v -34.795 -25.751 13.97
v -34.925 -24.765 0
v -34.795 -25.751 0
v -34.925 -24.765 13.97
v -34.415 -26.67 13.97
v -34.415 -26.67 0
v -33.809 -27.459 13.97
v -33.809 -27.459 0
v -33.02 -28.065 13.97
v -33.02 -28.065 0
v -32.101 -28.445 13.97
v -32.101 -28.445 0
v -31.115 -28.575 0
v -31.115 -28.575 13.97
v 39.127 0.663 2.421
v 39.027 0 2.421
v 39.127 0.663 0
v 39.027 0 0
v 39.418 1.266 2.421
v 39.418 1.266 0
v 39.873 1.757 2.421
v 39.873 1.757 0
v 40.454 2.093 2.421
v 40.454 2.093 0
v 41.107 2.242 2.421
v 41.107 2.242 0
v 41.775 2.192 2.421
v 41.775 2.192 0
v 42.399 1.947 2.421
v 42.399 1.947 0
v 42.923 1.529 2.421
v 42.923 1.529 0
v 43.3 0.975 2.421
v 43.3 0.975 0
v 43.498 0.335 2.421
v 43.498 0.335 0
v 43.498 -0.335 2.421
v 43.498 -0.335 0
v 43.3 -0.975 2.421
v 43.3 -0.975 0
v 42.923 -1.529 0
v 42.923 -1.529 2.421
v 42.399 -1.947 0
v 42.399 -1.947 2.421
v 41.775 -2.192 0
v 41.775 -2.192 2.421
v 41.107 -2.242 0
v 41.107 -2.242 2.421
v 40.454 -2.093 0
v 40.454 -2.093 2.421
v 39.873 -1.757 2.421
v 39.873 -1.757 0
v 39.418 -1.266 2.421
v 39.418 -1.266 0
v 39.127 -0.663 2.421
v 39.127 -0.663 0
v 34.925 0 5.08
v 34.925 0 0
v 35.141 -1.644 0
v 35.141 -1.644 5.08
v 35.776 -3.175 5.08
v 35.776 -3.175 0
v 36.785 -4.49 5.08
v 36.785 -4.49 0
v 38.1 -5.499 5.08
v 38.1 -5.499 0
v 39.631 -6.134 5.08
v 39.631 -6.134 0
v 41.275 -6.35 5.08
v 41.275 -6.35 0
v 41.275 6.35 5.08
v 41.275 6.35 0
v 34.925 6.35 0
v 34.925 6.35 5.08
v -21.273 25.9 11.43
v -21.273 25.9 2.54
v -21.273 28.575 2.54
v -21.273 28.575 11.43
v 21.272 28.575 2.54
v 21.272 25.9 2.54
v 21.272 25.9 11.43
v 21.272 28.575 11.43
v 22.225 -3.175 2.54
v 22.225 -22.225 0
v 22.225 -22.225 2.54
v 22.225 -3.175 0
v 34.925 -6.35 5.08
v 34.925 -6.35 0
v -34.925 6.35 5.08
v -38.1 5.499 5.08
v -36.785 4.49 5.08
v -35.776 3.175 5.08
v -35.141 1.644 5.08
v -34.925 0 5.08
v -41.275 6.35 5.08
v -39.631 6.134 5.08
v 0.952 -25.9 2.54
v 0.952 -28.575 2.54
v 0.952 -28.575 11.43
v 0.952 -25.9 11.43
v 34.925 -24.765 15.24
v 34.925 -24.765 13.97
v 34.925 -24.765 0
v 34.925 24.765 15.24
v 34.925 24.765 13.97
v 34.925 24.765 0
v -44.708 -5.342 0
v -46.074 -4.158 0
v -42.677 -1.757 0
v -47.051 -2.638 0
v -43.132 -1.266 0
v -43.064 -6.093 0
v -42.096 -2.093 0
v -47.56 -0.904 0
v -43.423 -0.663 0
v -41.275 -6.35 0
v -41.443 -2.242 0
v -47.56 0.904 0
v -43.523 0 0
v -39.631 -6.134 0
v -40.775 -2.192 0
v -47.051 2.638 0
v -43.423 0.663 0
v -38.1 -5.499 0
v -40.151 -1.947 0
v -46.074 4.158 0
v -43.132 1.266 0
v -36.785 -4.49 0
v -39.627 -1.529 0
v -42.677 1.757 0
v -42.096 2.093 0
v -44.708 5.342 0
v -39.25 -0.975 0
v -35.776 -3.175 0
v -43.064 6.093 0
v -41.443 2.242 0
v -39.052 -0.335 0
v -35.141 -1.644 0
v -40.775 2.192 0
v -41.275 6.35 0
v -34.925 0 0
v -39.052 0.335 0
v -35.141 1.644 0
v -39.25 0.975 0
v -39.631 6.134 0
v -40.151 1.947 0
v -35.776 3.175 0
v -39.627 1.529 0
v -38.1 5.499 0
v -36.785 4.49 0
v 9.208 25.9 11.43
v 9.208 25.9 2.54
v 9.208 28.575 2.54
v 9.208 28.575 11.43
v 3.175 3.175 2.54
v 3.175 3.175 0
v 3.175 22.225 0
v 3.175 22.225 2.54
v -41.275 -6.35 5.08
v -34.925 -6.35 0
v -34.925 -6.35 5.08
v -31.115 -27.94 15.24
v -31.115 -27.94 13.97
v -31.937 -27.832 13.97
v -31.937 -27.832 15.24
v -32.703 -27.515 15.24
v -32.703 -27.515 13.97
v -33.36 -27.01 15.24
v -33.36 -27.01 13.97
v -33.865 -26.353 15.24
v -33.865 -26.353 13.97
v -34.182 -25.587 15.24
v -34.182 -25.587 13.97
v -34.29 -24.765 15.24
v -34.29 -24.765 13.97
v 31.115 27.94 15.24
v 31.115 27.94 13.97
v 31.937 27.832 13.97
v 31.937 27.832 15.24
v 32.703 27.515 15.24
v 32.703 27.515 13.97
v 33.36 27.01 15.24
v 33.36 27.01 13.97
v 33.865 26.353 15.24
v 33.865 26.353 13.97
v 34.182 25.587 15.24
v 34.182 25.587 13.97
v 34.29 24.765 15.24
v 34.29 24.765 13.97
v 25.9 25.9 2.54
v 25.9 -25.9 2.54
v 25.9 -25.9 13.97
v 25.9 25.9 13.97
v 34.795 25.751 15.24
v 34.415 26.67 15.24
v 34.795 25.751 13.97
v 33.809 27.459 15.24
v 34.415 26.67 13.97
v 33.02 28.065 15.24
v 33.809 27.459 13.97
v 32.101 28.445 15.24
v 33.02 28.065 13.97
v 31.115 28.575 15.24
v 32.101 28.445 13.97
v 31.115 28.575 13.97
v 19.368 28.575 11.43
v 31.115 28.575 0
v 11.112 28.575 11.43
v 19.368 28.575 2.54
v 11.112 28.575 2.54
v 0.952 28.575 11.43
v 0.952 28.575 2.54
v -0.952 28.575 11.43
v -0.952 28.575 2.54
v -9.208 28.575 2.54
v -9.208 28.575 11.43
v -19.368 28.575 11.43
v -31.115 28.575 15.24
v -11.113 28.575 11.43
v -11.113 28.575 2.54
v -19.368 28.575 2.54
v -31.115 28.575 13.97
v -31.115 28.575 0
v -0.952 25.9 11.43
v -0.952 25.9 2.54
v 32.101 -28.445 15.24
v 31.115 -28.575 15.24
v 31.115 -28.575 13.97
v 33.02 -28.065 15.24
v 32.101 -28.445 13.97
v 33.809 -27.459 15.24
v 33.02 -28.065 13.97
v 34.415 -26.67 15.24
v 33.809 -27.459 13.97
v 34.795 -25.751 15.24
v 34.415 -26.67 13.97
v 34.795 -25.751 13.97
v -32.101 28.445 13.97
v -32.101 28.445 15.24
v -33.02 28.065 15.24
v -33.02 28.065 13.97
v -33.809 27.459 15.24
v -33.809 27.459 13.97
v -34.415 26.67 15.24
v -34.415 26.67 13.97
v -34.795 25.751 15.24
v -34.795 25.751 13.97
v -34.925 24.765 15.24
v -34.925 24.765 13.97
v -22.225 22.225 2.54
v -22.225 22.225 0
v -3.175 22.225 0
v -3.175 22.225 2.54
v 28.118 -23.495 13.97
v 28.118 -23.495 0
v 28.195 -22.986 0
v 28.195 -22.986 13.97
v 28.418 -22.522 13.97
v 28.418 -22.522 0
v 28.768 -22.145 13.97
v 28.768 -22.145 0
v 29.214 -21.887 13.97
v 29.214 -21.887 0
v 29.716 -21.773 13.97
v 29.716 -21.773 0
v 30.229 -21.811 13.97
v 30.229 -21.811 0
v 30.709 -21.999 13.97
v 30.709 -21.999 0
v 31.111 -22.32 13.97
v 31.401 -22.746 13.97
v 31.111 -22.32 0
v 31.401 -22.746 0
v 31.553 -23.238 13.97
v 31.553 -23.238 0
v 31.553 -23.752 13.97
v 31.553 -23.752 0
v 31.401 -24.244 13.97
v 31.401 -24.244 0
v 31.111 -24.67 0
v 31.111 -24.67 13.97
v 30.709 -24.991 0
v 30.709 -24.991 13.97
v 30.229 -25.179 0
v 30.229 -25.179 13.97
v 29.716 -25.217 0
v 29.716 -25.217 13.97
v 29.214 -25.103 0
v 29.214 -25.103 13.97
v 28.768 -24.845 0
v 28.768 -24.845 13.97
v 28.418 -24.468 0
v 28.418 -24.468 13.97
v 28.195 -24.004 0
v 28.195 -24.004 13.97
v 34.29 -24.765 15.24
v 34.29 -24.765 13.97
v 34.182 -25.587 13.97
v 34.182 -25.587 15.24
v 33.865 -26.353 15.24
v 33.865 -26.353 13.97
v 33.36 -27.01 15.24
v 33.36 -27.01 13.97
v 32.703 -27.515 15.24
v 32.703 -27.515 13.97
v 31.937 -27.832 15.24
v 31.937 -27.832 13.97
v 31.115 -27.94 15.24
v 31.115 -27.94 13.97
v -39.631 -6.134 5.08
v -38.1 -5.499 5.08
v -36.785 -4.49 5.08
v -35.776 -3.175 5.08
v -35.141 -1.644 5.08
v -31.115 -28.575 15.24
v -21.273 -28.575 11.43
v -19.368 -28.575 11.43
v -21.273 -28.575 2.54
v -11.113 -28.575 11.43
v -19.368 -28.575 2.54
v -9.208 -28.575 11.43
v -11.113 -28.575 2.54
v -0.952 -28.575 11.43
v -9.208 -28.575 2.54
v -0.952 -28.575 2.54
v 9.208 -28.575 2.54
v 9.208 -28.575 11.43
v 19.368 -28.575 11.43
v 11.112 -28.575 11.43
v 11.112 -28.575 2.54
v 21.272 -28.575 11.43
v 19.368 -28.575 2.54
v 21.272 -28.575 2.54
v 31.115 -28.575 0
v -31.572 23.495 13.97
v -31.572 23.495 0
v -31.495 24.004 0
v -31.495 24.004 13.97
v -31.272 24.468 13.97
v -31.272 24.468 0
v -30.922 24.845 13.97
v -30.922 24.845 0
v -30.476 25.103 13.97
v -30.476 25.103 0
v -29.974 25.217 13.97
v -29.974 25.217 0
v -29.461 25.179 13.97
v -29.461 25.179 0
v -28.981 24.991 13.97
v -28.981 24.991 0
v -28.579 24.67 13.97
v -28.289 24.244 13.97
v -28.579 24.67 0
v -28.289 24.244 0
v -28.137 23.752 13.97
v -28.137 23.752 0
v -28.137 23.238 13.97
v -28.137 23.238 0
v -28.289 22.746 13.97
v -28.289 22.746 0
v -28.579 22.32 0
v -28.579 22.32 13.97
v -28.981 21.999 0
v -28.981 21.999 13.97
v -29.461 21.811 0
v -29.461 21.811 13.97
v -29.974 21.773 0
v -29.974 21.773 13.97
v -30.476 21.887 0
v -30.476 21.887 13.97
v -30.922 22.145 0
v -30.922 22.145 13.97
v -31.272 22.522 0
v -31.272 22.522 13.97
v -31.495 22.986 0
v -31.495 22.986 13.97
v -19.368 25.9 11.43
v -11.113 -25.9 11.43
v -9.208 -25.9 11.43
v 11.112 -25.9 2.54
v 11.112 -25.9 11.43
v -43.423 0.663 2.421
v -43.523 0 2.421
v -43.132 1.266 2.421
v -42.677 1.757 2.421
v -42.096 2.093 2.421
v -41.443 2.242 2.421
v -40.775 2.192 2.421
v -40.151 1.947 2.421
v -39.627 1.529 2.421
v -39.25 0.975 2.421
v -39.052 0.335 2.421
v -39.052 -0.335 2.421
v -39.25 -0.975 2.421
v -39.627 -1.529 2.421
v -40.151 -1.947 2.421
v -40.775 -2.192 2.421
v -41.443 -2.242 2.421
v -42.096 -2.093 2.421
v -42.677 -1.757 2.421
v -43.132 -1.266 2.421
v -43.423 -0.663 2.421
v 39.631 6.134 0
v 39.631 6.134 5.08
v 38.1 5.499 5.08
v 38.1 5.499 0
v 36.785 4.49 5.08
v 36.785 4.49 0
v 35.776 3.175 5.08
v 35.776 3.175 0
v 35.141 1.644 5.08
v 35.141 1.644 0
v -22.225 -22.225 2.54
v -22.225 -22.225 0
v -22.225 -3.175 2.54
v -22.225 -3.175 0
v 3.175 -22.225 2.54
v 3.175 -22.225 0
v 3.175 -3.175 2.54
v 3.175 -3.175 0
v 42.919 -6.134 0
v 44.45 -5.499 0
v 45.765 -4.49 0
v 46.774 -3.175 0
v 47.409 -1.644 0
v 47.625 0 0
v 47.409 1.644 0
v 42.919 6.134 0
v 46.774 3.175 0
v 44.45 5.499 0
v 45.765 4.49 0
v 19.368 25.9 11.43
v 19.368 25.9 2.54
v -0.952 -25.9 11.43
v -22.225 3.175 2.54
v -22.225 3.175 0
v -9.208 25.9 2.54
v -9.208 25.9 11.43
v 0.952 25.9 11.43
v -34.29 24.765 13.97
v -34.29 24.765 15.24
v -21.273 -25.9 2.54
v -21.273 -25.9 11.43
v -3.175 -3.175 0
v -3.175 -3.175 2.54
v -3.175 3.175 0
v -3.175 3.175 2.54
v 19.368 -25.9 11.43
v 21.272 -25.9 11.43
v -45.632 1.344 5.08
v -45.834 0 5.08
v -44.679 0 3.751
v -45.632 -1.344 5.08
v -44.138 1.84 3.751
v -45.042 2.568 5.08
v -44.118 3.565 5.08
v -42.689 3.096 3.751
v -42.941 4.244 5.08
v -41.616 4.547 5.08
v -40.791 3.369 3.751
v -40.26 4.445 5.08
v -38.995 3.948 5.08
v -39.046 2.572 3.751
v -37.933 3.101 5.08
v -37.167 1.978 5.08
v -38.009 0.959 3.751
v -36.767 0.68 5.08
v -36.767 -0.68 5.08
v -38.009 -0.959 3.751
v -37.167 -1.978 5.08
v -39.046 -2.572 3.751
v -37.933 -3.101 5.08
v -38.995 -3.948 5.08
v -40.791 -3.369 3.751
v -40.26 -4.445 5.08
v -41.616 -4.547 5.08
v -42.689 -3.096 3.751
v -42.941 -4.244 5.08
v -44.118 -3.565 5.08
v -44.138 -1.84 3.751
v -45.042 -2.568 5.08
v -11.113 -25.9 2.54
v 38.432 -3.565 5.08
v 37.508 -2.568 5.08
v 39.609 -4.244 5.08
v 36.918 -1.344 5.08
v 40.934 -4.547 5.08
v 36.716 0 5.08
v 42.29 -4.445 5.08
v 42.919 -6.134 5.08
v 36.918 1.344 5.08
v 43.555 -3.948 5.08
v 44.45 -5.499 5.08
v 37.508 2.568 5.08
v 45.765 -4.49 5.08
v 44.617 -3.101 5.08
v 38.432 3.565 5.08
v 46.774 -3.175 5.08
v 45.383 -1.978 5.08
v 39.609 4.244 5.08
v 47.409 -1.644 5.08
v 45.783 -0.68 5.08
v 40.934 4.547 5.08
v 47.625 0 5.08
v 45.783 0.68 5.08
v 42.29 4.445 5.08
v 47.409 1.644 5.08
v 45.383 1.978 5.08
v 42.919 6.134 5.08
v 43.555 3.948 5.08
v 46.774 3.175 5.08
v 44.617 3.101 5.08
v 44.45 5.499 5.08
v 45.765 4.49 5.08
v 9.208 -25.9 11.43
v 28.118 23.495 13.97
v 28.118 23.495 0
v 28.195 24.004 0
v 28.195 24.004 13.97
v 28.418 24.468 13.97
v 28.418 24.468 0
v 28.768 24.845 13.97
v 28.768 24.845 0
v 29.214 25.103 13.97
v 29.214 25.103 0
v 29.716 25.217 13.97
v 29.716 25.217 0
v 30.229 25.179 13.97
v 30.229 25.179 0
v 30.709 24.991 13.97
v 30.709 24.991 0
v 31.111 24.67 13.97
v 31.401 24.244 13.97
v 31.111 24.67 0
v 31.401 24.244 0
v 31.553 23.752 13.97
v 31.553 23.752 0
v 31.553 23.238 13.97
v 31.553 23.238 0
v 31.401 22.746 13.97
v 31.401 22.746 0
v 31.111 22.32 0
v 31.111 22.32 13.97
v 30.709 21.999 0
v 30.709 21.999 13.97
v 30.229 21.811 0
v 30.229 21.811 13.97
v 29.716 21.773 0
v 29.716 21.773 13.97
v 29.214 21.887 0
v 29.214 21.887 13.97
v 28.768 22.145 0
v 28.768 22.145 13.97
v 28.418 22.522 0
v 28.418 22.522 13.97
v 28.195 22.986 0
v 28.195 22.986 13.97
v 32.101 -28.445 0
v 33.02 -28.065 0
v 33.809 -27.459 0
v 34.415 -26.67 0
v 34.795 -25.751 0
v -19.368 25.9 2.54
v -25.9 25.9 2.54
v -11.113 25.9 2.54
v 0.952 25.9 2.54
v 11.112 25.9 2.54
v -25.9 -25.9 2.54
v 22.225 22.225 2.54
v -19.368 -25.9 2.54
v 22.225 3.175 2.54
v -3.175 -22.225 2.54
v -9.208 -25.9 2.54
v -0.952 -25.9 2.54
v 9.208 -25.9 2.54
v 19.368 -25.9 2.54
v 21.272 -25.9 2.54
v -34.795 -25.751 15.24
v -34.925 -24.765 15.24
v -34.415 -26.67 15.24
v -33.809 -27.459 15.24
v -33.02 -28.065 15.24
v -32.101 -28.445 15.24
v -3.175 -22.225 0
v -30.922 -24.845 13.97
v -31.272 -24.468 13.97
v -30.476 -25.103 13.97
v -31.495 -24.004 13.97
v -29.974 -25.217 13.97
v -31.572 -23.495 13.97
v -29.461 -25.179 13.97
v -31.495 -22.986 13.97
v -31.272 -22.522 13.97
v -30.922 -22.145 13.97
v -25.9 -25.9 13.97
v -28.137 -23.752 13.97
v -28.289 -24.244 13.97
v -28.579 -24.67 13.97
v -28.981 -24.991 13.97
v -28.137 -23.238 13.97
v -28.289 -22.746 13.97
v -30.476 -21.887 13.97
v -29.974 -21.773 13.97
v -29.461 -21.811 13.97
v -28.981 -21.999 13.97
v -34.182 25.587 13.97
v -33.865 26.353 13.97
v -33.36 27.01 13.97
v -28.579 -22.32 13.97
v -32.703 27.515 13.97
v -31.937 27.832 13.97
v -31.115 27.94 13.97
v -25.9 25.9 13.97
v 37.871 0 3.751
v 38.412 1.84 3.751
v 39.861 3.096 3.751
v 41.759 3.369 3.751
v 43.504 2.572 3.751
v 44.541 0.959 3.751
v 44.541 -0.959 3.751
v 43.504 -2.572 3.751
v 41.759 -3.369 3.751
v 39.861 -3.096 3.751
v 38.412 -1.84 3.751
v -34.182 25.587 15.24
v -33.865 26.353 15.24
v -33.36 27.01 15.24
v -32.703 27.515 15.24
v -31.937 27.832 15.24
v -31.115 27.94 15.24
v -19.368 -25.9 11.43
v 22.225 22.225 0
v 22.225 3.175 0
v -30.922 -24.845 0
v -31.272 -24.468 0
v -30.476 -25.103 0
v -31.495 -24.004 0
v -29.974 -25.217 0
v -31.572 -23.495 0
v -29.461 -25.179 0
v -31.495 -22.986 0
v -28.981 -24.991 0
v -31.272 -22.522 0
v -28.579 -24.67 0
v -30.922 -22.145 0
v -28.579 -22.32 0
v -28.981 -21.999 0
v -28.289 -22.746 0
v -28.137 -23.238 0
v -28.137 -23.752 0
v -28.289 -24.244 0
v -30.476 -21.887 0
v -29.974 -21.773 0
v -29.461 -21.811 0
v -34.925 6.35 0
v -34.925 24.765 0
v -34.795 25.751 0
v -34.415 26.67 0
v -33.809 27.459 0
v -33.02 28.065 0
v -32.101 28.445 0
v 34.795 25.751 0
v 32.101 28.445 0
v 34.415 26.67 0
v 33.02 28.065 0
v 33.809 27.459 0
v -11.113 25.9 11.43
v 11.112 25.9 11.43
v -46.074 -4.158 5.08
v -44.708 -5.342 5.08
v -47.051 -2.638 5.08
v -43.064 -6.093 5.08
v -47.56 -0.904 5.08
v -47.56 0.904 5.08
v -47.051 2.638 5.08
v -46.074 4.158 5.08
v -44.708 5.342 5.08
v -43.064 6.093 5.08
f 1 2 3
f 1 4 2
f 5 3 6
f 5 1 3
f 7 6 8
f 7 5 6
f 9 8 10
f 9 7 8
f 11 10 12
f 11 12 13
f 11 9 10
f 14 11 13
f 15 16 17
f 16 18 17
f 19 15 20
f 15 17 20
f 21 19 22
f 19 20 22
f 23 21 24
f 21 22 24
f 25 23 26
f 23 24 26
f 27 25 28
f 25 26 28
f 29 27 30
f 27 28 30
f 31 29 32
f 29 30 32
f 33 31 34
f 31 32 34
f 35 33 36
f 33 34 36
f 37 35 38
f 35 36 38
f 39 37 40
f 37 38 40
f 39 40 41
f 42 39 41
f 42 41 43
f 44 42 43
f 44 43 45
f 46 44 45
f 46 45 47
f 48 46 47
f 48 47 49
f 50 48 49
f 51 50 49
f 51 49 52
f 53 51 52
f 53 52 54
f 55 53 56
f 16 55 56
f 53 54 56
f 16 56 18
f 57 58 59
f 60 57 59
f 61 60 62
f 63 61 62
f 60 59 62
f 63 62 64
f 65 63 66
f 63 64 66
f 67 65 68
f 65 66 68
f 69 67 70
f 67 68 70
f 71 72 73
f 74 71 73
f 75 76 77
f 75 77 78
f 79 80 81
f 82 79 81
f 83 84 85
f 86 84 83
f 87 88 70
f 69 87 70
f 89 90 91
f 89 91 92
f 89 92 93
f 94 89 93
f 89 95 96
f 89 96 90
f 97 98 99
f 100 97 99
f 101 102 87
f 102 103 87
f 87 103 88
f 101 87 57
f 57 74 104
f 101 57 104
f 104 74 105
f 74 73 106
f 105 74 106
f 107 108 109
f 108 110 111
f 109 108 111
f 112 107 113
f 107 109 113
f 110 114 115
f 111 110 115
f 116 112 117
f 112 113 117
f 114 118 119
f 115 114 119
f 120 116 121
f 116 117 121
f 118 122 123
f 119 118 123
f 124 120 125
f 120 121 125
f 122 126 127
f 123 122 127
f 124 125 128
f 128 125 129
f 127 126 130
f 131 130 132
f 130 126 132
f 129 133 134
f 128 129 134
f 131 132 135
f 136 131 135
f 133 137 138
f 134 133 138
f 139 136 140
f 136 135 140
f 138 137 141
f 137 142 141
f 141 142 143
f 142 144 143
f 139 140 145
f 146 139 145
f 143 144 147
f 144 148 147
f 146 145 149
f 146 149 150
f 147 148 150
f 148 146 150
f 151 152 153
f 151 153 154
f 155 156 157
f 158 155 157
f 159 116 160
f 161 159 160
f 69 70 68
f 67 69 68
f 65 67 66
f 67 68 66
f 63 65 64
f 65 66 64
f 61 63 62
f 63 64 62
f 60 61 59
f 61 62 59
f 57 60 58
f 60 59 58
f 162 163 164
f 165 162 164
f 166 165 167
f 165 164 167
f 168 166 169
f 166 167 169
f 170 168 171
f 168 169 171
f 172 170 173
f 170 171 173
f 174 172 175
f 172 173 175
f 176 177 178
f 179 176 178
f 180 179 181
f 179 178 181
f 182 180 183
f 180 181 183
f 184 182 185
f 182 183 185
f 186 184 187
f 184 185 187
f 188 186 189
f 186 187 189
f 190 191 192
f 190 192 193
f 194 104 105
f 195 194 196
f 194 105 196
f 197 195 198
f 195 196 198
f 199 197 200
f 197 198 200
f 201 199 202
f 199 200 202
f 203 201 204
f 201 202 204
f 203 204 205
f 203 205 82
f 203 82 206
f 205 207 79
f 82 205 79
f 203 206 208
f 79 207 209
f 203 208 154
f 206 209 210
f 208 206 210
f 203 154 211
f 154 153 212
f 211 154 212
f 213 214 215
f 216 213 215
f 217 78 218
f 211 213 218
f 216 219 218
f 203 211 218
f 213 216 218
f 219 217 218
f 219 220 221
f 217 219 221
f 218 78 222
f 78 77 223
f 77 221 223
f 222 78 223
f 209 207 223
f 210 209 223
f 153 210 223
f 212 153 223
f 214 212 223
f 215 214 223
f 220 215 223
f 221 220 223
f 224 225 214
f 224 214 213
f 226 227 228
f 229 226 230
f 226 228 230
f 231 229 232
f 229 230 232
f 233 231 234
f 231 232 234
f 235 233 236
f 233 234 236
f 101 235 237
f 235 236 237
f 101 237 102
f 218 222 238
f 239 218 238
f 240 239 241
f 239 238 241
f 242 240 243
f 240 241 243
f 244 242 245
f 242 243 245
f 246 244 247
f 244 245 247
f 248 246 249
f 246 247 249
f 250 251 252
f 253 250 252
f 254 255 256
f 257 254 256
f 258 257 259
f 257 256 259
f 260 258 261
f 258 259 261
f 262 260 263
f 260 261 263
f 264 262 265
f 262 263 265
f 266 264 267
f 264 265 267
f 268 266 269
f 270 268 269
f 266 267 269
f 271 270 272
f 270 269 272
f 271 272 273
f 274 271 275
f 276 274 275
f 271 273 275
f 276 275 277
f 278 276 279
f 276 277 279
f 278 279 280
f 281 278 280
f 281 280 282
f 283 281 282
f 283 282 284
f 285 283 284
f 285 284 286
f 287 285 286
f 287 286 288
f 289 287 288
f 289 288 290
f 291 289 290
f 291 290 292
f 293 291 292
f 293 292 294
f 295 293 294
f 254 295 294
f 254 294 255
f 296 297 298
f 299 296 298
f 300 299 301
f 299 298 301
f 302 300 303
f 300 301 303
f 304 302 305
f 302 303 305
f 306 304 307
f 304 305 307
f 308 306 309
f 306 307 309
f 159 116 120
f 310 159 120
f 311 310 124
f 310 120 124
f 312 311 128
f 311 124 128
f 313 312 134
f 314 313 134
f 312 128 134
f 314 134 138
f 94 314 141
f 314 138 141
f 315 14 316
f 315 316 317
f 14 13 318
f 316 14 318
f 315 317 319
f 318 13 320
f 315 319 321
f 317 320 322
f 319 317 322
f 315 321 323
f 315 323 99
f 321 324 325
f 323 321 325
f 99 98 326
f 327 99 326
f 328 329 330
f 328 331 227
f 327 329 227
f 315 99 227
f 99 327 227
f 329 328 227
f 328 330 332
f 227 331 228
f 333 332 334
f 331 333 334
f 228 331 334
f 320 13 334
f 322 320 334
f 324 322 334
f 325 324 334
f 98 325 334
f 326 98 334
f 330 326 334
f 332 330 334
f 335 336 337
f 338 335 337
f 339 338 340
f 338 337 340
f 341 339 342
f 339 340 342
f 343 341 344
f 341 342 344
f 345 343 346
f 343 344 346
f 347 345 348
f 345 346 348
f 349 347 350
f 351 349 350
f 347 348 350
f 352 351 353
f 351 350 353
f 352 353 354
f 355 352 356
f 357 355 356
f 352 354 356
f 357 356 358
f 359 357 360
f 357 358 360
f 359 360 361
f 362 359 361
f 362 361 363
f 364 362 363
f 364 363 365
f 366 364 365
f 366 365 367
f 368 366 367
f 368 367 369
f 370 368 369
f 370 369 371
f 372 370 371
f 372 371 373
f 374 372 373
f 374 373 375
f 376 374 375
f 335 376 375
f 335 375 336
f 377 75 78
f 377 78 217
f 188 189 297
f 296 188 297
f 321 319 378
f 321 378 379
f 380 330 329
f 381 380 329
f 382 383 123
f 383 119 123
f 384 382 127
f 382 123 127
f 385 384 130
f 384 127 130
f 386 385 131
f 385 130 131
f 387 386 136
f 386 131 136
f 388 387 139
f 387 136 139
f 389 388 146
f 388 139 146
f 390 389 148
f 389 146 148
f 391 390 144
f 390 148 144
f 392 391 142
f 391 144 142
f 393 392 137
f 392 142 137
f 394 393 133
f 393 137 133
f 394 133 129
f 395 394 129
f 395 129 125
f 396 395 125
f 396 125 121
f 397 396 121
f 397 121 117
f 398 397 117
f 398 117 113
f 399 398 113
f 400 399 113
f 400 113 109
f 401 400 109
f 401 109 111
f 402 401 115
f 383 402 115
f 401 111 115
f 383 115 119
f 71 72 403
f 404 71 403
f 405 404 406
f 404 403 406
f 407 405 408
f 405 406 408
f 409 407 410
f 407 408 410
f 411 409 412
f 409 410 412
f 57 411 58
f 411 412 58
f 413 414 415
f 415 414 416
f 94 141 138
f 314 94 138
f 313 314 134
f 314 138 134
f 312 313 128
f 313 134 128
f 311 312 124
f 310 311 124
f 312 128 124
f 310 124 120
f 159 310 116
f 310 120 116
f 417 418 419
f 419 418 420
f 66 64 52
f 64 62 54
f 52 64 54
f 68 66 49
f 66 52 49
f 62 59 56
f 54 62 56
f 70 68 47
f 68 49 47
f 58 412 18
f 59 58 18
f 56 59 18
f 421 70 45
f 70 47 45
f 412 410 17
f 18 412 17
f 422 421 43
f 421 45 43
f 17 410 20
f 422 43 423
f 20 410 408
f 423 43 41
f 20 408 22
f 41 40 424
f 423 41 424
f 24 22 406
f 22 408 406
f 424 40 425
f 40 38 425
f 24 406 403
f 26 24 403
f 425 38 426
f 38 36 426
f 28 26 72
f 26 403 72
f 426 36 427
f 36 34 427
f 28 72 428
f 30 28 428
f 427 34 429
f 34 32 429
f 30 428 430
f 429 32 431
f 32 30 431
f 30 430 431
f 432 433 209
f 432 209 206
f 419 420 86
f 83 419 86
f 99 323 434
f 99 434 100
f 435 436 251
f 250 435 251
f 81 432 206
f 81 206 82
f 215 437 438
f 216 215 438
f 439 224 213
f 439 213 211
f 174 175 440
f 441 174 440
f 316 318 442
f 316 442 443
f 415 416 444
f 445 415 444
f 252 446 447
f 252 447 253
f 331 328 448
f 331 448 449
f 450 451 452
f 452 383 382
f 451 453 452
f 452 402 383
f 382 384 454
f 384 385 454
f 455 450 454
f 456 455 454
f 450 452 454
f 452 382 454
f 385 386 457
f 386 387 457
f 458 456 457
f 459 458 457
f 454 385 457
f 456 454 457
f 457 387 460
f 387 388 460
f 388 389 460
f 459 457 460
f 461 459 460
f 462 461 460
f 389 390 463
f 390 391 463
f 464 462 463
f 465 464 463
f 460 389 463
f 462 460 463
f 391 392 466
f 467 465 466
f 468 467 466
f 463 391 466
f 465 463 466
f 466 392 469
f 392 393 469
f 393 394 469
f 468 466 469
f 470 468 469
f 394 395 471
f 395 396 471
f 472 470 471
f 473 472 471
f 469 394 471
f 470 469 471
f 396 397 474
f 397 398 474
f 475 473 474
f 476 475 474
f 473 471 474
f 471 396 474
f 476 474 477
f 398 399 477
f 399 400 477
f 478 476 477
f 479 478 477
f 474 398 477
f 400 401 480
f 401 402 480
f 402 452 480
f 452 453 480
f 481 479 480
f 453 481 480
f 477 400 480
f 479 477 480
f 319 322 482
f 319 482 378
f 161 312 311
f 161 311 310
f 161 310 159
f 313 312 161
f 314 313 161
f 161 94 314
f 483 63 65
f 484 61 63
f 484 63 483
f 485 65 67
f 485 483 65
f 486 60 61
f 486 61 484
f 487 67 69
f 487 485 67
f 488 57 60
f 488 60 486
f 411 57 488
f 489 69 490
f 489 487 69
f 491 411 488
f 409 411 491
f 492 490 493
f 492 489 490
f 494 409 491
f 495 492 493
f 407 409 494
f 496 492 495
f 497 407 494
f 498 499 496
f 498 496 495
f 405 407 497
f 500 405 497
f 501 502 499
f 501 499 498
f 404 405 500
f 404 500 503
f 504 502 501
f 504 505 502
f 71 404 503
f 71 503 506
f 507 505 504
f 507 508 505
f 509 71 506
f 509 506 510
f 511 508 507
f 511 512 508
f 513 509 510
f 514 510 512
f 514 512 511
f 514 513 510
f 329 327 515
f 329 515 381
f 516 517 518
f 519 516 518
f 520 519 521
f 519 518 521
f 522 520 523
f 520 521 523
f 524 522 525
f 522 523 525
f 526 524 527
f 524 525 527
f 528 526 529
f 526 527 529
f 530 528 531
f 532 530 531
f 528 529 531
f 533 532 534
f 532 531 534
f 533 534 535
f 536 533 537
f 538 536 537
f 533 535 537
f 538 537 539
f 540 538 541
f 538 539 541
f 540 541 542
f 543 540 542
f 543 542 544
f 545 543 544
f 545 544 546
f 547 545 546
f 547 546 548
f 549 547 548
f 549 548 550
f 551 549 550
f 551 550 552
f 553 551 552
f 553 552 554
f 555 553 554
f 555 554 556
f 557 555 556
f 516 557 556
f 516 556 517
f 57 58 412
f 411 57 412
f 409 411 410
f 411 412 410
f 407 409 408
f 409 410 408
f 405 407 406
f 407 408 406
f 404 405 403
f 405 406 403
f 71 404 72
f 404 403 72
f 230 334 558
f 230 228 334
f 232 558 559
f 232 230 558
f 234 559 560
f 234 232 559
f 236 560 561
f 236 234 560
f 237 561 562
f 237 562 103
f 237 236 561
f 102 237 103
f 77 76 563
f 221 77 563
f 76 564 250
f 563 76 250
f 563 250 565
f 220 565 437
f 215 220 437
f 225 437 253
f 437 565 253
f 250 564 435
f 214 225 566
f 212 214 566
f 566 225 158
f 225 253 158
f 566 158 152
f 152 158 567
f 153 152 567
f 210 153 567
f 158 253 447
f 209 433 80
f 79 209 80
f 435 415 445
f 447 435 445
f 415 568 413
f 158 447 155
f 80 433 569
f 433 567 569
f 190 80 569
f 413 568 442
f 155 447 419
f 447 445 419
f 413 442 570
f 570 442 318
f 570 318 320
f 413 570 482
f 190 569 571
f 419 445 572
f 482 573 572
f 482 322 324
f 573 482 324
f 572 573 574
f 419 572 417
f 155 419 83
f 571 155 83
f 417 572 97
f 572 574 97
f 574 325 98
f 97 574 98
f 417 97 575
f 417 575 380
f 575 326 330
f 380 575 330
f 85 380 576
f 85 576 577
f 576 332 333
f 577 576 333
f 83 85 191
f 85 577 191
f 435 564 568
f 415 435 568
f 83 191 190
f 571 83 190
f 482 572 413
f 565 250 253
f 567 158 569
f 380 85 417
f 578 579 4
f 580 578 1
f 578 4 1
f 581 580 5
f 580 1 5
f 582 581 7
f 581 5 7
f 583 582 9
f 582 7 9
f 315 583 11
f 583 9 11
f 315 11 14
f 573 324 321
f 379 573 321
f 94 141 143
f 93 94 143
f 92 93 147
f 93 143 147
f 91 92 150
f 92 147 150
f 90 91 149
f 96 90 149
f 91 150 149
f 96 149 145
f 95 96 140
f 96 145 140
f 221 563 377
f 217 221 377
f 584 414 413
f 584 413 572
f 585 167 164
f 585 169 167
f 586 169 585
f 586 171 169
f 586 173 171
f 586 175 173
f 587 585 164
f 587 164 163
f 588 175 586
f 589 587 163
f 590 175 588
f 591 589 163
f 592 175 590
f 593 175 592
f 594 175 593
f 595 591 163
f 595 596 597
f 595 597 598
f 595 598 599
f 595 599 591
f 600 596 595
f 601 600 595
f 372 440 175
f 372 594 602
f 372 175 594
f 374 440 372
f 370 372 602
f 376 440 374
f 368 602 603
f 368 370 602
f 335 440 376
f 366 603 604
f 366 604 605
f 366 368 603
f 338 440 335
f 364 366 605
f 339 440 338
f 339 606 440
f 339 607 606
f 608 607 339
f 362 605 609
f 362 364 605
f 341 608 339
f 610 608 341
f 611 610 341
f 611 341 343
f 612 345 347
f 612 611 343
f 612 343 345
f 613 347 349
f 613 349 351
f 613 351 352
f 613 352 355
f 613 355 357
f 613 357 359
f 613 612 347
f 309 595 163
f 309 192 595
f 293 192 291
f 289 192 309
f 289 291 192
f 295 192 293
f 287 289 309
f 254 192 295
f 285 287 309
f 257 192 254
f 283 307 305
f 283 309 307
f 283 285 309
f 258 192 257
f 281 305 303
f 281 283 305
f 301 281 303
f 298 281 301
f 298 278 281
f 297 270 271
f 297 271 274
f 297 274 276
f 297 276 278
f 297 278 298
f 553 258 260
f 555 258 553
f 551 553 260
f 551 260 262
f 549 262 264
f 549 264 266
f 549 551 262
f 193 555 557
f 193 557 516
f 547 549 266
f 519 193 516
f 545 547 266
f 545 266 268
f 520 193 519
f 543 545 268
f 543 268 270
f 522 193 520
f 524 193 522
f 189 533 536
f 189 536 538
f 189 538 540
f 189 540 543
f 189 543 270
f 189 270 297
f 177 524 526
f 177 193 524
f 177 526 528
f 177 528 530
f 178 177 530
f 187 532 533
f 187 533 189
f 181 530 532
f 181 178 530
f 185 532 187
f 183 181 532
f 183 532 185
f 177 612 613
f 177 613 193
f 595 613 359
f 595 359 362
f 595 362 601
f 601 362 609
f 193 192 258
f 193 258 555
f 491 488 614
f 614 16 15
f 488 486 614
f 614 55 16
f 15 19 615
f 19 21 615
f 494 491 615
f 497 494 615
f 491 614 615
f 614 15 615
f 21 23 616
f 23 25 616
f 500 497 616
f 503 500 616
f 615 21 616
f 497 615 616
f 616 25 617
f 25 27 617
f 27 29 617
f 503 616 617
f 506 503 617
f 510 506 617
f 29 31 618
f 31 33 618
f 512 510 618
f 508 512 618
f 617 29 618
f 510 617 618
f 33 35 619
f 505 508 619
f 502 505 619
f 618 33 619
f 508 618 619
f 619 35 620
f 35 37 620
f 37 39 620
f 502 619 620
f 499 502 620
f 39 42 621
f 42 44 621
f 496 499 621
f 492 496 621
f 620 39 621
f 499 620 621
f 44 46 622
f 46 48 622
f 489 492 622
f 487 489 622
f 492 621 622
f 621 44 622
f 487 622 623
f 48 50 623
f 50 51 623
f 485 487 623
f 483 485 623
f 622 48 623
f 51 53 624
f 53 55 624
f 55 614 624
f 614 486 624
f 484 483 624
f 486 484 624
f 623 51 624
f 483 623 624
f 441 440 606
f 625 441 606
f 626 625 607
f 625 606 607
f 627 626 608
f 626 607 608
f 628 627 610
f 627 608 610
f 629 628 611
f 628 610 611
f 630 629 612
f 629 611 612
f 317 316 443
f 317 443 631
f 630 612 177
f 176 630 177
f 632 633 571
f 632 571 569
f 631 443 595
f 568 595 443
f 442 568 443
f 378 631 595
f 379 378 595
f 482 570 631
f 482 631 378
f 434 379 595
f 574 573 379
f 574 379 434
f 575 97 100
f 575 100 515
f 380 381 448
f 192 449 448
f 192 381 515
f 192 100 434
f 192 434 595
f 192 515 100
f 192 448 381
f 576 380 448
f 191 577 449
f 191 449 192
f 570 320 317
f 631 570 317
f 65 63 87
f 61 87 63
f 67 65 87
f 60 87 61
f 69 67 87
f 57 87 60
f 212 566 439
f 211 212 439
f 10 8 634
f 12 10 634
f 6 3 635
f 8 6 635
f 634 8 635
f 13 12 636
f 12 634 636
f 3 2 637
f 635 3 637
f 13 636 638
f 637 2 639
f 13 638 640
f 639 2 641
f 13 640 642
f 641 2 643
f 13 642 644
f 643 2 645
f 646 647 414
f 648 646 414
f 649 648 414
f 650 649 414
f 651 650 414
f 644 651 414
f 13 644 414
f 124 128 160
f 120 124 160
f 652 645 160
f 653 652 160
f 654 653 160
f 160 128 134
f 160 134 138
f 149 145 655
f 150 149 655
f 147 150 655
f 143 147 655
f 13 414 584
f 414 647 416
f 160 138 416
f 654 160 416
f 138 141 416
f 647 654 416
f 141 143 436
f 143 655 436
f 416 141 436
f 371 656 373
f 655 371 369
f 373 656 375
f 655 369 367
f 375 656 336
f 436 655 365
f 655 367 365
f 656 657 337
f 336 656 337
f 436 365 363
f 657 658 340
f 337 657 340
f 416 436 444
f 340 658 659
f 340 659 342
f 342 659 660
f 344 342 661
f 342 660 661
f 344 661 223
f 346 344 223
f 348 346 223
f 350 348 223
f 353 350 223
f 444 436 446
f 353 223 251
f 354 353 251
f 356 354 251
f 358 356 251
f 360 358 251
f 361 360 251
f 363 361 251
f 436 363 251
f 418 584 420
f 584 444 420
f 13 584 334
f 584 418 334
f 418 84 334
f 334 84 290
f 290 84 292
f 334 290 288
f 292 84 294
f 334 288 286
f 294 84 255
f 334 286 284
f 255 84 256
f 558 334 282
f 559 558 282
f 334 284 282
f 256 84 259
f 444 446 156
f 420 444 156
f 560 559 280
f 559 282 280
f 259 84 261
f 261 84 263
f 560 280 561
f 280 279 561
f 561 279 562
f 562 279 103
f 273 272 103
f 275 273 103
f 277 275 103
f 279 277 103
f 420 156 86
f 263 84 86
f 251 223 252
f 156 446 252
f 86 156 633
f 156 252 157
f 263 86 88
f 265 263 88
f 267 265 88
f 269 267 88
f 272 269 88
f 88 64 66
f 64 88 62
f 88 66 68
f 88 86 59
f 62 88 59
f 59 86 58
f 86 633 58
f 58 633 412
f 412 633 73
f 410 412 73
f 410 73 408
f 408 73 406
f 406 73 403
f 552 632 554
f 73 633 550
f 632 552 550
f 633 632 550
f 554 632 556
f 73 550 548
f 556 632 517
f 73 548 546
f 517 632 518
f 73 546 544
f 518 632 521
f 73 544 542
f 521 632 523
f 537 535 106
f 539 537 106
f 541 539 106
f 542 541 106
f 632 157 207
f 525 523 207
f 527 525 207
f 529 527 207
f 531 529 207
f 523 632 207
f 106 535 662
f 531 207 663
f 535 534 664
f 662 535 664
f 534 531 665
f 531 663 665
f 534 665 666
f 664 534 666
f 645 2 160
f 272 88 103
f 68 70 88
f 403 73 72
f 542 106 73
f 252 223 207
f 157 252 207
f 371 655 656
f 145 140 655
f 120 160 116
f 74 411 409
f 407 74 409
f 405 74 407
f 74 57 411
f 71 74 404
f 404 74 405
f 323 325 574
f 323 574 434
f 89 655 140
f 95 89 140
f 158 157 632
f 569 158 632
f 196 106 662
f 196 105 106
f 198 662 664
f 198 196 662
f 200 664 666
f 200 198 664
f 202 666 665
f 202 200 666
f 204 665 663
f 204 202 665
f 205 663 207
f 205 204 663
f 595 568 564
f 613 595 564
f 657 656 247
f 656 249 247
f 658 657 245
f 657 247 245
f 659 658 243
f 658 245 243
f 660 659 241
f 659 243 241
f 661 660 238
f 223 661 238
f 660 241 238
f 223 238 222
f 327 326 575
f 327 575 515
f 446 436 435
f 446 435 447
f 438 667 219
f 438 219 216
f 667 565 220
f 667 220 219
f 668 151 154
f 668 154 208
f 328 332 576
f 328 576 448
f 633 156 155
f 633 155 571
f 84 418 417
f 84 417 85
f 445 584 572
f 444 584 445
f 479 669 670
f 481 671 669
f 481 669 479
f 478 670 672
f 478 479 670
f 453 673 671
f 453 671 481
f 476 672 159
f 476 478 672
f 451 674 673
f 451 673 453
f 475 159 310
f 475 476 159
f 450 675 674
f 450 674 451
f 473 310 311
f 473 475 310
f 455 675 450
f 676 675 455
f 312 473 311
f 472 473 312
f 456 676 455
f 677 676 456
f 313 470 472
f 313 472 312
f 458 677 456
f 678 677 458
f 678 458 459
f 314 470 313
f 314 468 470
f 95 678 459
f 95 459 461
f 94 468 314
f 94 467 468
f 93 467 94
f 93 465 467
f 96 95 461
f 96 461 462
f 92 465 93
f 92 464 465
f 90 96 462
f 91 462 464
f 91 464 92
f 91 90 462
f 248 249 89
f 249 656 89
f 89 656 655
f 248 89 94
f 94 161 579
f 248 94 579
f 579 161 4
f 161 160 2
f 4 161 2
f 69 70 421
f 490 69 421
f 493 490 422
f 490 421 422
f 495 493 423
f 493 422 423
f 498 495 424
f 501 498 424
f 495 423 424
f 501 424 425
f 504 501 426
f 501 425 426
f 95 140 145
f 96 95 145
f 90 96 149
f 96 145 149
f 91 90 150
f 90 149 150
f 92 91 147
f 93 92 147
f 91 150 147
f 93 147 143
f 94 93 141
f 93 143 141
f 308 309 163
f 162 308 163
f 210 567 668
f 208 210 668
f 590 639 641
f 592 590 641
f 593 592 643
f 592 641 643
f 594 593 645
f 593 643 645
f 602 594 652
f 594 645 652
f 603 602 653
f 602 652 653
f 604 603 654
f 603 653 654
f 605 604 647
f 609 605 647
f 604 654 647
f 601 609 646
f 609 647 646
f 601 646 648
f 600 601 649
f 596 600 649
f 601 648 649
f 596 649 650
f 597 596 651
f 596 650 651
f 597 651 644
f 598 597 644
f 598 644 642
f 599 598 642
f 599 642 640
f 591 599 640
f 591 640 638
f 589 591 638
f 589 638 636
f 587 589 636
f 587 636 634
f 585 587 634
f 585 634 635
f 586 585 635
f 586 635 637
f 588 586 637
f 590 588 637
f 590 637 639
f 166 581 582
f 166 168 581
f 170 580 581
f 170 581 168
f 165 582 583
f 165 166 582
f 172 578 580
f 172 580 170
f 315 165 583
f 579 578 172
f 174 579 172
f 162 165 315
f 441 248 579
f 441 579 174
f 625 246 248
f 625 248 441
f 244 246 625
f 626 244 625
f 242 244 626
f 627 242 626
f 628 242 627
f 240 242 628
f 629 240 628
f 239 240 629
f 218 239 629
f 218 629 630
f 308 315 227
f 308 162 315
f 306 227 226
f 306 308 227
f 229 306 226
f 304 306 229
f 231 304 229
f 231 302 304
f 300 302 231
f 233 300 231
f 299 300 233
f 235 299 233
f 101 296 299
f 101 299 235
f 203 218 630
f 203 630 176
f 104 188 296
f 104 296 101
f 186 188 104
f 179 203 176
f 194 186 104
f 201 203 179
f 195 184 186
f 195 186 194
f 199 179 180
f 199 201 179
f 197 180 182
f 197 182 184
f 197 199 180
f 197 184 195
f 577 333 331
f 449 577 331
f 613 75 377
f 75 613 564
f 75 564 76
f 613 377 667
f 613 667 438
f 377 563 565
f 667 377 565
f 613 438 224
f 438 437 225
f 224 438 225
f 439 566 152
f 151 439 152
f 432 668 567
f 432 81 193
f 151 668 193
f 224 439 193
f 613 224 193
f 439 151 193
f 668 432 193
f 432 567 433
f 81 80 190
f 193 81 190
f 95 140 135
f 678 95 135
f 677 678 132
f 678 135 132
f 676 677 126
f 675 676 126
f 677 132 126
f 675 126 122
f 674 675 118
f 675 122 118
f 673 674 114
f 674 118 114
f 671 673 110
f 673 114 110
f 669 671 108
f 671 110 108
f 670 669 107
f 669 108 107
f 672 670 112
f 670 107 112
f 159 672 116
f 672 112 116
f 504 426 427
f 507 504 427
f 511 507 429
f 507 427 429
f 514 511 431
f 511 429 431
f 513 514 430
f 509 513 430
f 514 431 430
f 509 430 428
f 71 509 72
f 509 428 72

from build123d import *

# Parameters (mm, degrees)
F0_W              = 51.8
F0_H              = 51.8
F1_DEPTH          = 13.97
F2_DEPTH          = 5.08
F0_W_2            = 19.05
F0_H_2            = 19.05
F3_DEPTH          = 2.54
F4_R              = 3.81
F7_D              = 3.4544
F9_W              = 1.905
F9_H              = 8.89
F10_DEPTH         = 57.15
F11_DEPTH         = 5.08
F14_D             = 4.4958
F14_CSINK_D       = 9.1186
F14_CSINK_ANGLE   = 82
F14_2_D           = 4.4958
F14_2_CSINK_D     = 9.1186
F14_2_CSINK_ANGLE = 82
F16_DEPTH         = 1.27


# Not quite as in the source:
# - a feature names something its author has since deleted; it is built from what else it names


with BuildPart() as f1:
    # F0 (on Top) → F1 (new body)
    with BuildSketch(Plane.XY):
        Polygon((-34.925, -28.575), (34.925, -28.575), (34.925, -6.35), (34.925, 4.95e-08), (34.925, 6.35), (34.925, 28.575), (-34.925, 28.575), (-34.925, 6.35), (-34.925, 0), (-34.925, -6.35), align=None)
        Rectangle(F0_W, F0_H, mode=Mode.SUBTRACT)
    extrude(amount=F1_DEPTH)

    # F0 (on Top) → F2 (join)
    with BuildSketch(Plane.XY):
        with BuildLine():
            ThreePointArc((-41.275, 6.35), (-36.7848719395, 4.4901280605), (-34.925, 0))
            Line((-34.925, 0), (-34.925, 6.35))
            Line((-34.925, 6.35), (-41.275, 6.35))
        make_face()
        with BuildLine():
            Line((34.925, 6.35), (34.925, 4.95e-08))
            ThreePointArc((34.925, 4.95e-08), (36.784871957, 4.490128078), (41.275, 6.35))
            Line((41.275, 6.35), (34.925, 6.35))
        make_face()
        with BuildLine():
            Line((34.925, 4.95e-08), (34.925, -6.35))
            Line((34.925, -6.35), (41.275, -6.35))
            ThreePointArc((41.275, -6.35), (36.784871922, -4.490128043), (34.925, 4.95e-08))
        make_face()
        with BuildLine():
            Line((-41.275, -6.35), (-34.925, -6.35))
            Line((-34.925, -6.35), (-34.925, 0))
            ThreePointArc((-34.925, 0), (-36.7848719395, -4.4901280605), (-41.275, -6.35))
        make_face()
    extrude(amount=F2_DEPTH)

    # F0 (on Top) → F3 (join)
    with BuildSketch(Plane.XY):
        Rectangle(F0_W, F0_H)
        with Locations((-12.7, -12.7)):
            Rectangle(F0_W_2, F0_H_2, mode=Mode.SUBTRACT)
        with Locations((12.7, -12.7)):
            Rectangle(F0_W_2, F0_H_2, mode=Mode.SUBTRACT)
        with Locations((-12.7, 12.7)):
            Rectangle(F0_W_2, F0_H_2, mode=Mode.SUBTRACT)
        with Locations((12.7, 12.7)):
            Rectangle(F0_W_2, F0_H_2, mode=Mode.SUBTRACT)
    extrude(amount=F3_DEPTH)

    # F4
    f4_edges = [f1.edges().sort_by_distance(p)[0] for p in [
        (-34.925, -28.575, 6.985),
        (34.925, 28.575, 6.985),
        (34.925, -28.575, 6.985),
        (-34.925, 28.575, 6.985),
    ]]
    fillet(f4_edges, radius=F4_R)

    # F7 (through all)
    with Locations(Plane.XY.offset(13.97)):
        with Locations((-29.845, 23.495), (-29.845, -23.495), (29.845, -23.495), (29.845, 23.495)):
            Hole(F7_D / 2)

    # F9 (on offset) → F10 (cut)
    with BuildSketch(Plane.XZ.offset(28.575)):
        with Locations((10.16, 6.985)):
            Rectangle(F9_W, F9_H)
        with Locations((0, 6.985)):
            Rectangle(F9_W, F9_H)
        with Locations((-20.3200003028, 6.985)):
            Rectangle(F9_W, F9_H)
        with Locations((-10.1600001514, 6.985)):
            Rectangle(F9_W, F9_H)
        with Locations((20.32, 6.985)):
            Rectangle(F9_W, F9_H)
    extrude(amount=-F10_DEPTH, mode=Mode.SUBTRACT)

    # F15 (on face) → F16 (join)
    with BuildSketch(Plane.XY.offset(13.97)):
        with BuildLine():
            ThreePointArc((-34.925, -24.765), (-33.8090768363, -27.4590768363), (-31.115, -28.575))
            Line((-31.115, -28.575), (31.115, -28.575))
            ThreePointArc((31.115, -28.575), (33.8090768363, -27.4590768363), (34.925, -24.765))
            Line((34.925, -24.765), (34.925, 24.765))
            ThreePointArc((34.925, 24.765), (33.8090768363, 27.4590768363), (31.115, 28.575))
            Line((31.115, 28.575), (-31.115, 28.575))
            ThreePointArc((-31.115, 28.575), (-33.8090768363, 27.4590768363), (-34.925, 24.765))
            Line((-34.925, 24.765), (-34.925, -24.765))
        make_face()
        with BuildLine():
            Line((34.29, 24.765), (34.29, -24.765))
            ThreePointArc((34.29, -24.765), (33.3600640303, -27.0100640303), (31.115, -27.94))
            Line((31.115, -27.94), (-31.115, -27.94))
            ThreePointArc((-31.115, -27.94), (-33.3600640303, -27.0100640303), (-34.29, -24.765))
            Line((-34.29, -24.765), (-34.29, 24.765))
            ThreePointArc((-34.29, 24.765), (-33.3600640303, 27.0100640303), (-31.115, 27.94))
            Line((-31.115, 27.94), (31.115, 27.94))
            ThreePointArc((31.115, 27.94), (33.3600640303, 27.0100640303), (34.29, 24.765))
        make_face(mode=Mode.SUBTRACT)
    extrude(amount=F16_DEPTH)


with BuildPart() as f11:
    # F0 (on Top) → F11 (new body)
    with BuildSketch(Plane.XY):
        with BuildLine():
            ThreePointArc((41.275, 6.35), (36.784871957, 4.490128078), (34.925, 4.95e-08))
            ThreePointArc((34.925, 4.95e-08), (36.784871922, -4.490128043), (41.275, -6.35))
            ThreePointArc((41.275, -6.35), (45.7651280605, -4.4901280605), (47.625, 0))
            ThreePointArc((47.625, 0), (45.7651280605, 4.4901280605), (41.275, 6.35))
        make_face()
    extrude(amount=F11_DEPTH)

    # F14 (through all)
    with Locations(Plane.XY.offset(5.08)):
        with Locations((-41.275, 0), (41.275, 0)):
            CounterSinkHole(F14_D / 2, F14_CSINK_D / 2, counter_sink_angle=F14_CSINK_ANGLE)


with BuildPart() as f11b:
    # F0 (on Top) → F11, piece 2 (new body)
    with BuildSketch(Plane.XY):
        with BuildLine():
            ThreePointArc((-41.275, -6.35), (-36.7848719395, -4.4901280605), (-34.925, 0))
            ThreePointArc((-34.925, 0), (-36.7848719395, 4.4901280605), (-41.275, 6.35))
            ThreePointArc((-41.275, 6.35), (-47.625, 0), (-41.275, -6.35))
        make_face()
    extrude(amount=F11_DEPTH)

    # F14#2 (through all)
    with Locations(Plane.XY.offset(5.08)):
        with Locations((-41.275, 0), (41.275, 0)):
            CounterSinkHole(F14_2_D / 2, F14_2_CSINK_D / 2, counter_sink_angle=F14_2_CSINK_ANGLE)


solid = Compound([f1.part, f11.part, f11b.part])
